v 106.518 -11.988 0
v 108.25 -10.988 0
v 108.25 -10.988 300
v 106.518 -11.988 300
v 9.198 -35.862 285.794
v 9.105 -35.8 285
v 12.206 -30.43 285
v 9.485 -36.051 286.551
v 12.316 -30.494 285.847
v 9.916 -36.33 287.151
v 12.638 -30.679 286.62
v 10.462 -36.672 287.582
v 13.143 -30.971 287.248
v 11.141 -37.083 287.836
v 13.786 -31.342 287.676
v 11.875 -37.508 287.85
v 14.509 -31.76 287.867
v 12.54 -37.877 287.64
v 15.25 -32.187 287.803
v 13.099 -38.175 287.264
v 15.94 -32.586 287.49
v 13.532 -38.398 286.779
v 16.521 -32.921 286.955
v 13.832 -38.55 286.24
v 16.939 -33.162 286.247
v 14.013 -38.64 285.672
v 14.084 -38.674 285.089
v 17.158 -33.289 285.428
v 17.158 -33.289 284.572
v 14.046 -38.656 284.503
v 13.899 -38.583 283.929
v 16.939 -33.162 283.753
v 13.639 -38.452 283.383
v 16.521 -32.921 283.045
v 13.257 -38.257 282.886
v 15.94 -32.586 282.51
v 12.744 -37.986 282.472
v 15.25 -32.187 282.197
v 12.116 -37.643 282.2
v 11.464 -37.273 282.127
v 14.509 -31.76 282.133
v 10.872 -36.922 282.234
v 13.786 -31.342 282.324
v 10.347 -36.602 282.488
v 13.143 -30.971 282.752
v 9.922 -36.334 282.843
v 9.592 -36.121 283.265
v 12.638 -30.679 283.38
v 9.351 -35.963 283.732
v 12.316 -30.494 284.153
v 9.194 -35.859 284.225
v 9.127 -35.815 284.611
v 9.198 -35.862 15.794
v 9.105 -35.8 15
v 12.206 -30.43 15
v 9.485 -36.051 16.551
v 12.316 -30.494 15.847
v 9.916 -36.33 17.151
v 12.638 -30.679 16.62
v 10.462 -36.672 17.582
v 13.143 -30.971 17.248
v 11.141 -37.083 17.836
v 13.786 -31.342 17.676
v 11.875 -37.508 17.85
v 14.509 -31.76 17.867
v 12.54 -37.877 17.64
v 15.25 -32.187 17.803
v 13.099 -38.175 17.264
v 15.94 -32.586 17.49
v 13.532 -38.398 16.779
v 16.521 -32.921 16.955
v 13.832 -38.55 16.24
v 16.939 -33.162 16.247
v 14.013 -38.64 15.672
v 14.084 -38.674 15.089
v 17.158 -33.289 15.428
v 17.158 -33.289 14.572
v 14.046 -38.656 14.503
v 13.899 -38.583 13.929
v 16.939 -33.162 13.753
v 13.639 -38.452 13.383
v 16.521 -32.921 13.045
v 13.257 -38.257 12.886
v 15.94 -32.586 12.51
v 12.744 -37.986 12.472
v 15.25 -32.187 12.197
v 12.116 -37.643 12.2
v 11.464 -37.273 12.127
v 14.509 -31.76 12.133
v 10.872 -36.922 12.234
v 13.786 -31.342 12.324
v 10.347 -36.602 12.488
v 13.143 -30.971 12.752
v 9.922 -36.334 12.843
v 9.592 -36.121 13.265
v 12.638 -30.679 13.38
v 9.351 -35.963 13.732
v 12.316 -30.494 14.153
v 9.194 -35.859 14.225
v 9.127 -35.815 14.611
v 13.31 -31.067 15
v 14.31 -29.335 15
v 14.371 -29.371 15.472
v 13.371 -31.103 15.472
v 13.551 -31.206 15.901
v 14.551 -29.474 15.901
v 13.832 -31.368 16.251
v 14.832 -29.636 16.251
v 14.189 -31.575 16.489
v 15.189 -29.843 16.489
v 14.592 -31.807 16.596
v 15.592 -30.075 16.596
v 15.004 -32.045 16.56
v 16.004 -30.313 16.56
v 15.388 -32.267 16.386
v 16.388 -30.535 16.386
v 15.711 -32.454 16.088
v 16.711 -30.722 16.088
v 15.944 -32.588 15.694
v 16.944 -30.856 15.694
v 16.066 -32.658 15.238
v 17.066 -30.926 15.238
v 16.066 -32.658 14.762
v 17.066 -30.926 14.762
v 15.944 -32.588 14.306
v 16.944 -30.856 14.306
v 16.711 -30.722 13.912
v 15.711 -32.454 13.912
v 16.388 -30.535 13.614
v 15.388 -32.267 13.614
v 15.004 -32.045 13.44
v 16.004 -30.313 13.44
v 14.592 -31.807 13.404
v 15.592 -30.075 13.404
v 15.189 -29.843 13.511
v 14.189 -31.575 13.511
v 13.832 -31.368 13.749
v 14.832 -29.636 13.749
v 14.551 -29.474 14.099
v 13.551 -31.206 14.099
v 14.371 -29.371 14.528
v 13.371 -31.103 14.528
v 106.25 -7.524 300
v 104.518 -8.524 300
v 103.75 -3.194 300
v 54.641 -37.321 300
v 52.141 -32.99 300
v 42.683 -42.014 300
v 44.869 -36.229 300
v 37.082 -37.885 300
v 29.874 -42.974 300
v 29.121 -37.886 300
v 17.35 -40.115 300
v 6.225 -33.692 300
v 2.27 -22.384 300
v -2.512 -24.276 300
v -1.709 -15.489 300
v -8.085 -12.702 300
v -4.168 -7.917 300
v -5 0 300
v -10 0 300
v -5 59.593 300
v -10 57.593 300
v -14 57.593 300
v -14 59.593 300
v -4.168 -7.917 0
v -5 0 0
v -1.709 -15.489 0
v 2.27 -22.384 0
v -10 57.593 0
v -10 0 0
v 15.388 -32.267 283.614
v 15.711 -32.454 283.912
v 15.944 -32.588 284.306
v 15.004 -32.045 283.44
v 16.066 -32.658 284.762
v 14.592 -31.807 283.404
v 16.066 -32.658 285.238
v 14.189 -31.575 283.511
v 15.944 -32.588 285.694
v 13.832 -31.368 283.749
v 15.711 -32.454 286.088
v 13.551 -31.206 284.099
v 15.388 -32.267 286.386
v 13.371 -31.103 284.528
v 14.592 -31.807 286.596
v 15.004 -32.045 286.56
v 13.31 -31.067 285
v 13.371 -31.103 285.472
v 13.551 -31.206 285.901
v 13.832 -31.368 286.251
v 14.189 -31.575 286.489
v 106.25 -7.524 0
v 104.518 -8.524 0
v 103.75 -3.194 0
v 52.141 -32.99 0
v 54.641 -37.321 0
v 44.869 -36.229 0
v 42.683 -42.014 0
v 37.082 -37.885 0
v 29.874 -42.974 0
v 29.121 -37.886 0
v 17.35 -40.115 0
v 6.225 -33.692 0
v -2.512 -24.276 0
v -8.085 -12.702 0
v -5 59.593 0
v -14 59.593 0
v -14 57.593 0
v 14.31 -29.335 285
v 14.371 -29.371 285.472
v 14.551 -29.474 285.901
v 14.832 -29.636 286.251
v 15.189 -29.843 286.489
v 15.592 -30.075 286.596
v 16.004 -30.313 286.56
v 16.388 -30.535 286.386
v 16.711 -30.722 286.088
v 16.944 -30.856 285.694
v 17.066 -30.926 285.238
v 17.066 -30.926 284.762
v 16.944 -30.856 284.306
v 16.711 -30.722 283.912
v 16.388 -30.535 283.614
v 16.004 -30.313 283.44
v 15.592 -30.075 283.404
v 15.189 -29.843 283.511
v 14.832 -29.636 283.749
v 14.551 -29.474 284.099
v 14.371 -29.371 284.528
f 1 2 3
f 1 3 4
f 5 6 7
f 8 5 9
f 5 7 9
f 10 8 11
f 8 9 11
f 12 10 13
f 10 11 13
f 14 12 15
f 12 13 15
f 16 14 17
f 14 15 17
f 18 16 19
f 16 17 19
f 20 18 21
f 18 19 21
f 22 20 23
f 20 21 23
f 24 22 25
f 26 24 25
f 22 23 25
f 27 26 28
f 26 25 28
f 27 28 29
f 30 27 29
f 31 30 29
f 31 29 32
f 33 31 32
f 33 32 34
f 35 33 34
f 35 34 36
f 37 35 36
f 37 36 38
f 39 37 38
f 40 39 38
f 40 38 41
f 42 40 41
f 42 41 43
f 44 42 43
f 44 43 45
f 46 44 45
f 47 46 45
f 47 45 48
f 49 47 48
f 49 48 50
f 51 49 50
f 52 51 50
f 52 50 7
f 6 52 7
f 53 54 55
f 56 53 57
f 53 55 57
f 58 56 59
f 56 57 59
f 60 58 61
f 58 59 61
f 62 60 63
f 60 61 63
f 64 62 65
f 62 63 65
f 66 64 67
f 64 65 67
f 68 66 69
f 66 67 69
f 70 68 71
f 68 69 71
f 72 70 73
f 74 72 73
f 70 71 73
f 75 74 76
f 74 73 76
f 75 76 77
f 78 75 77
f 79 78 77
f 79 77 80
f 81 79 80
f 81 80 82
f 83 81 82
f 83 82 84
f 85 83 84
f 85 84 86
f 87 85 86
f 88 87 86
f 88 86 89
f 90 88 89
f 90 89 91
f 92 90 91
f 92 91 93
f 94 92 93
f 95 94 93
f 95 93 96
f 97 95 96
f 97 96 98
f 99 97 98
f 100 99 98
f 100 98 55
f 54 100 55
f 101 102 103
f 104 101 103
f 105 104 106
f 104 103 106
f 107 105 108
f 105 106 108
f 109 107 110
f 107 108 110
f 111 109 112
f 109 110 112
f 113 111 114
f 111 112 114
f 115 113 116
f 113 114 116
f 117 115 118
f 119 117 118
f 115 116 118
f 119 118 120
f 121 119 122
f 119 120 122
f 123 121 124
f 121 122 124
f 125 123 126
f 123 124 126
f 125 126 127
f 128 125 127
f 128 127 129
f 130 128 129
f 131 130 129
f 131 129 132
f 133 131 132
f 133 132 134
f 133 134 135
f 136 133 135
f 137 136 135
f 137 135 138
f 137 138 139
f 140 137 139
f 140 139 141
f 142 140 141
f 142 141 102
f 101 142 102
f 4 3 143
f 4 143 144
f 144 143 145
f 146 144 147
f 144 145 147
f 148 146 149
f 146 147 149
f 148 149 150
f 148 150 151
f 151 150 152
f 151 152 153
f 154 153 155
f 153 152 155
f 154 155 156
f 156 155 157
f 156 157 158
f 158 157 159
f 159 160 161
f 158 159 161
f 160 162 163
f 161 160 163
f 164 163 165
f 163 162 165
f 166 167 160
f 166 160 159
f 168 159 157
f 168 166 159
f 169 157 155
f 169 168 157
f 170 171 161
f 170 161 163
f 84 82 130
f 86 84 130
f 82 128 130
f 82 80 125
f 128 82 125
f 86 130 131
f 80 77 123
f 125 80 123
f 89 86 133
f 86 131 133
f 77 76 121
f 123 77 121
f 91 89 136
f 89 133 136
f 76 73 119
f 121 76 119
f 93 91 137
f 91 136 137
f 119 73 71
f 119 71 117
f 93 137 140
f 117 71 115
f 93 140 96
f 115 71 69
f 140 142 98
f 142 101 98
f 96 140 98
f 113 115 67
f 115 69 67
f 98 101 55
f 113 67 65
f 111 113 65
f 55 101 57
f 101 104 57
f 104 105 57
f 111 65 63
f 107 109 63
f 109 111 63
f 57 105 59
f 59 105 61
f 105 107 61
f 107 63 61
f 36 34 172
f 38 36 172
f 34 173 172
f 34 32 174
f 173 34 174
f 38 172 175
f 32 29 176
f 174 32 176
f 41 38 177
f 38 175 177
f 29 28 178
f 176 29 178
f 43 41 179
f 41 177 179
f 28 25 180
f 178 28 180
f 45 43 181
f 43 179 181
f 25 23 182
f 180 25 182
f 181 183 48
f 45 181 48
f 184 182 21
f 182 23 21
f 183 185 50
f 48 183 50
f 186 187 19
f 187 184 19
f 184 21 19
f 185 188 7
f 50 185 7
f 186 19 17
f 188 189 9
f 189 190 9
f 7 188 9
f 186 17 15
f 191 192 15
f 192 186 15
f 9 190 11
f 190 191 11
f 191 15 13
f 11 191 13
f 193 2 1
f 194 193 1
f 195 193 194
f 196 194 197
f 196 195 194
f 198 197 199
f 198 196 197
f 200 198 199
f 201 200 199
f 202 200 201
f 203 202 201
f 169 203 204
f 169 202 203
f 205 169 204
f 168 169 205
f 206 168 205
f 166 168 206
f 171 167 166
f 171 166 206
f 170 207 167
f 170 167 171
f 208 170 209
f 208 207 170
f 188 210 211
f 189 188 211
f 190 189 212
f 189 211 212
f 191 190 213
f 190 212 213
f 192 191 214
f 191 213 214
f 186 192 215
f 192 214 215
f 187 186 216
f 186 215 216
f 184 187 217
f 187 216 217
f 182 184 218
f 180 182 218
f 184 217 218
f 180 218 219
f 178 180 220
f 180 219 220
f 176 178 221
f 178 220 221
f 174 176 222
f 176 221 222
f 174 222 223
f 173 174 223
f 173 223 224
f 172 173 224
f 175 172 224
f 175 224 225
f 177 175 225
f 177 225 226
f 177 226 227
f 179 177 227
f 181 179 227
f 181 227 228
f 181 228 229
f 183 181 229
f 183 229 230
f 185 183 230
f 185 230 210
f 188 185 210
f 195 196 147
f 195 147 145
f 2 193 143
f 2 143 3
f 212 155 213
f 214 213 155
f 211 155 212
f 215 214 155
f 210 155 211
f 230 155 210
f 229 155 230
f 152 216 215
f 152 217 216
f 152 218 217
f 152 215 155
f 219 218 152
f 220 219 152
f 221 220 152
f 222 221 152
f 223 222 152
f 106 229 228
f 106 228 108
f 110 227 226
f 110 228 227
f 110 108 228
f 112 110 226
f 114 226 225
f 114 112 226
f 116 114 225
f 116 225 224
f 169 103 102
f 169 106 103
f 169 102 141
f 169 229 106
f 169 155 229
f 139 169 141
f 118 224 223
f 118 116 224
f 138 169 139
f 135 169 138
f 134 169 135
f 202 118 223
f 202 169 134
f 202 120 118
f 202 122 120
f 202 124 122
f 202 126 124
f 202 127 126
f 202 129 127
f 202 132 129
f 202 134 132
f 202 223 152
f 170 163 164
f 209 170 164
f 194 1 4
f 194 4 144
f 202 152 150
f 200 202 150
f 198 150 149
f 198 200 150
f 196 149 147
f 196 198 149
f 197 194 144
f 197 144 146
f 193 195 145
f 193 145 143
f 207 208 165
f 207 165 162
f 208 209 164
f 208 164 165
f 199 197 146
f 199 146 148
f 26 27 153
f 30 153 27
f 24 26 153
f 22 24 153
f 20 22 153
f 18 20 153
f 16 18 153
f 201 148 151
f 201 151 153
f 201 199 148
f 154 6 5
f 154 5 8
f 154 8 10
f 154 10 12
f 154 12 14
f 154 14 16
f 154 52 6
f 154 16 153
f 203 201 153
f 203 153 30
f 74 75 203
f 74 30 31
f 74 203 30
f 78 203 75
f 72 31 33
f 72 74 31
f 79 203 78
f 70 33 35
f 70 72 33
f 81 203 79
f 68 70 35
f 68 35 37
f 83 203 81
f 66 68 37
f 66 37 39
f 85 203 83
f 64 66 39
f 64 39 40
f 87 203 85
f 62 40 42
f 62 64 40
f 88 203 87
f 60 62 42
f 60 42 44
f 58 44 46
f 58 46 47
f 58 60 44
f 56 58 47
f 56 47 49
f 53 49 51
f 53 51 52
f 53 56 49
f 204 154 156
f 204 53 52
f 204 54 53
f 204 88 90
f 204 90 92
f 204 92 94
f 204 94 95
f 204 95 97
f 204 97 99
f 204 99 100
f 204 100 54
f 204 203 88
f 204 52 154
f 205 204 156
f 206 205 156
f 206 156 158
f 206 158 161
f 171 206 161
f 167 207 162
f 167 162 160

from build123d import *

# Parameters (mm, degrees)
BOSS_EXTRUDE1_DEPTH = 300
SKETCH3_R           = 1.6
CUT_EXTRUDE1_DEPTH  = 331.850051567
CUT_EXTRUDE2_START  = -2
SKETCH4_R           = 2.875
CUT_EXTRUDE2_DEPTH  = 329.850051657


with BuildPart() as part:
    # Sketch2 → Boss-Extrude1 (new body)
    with BuildSketch(Plane.XY):
        with BuildLine():
            Line((-10, 0), (-10, 57.592991829))
            Line((-10, 57.592991829), (-14, 57.592991829))
            Line((-14, 57.592991829), (-14, 59.592991829))
            Line((-14, 59.592991829), (-10, 59.592991829))
            Line((-10, 59.592991829), (-5, 59.592991829))
            Line((-5, 59.592991829), (-5, 0))
            ThreePointArc((-5, 0), (-3.13691529, -11.76748288), (2.270101024, -22.383928263))
            Line((2.270101024, -22.383928263), (29.120915128, -37.886253013))
            ThreePointArc((29.120915128, -37.886253013), (41.018534684, -37.260643809), (52.141016151, -32.990381057))
            Line((52.141016151, -32.990381057), (103.750060963, -3.193885142))
            Line((103.750060963, -3.193885142), (106.250060963, -7.524012161))
            Line((106.250060963, -7.524012161), (108.250060963, -10.988113776))
            Line((108.250060963, -10.988113776), (106.518010155, -11.988113776))
            Line((106.518010155, -11.988113776), (104.518010155, -8.524012161))
            Line((104.518010155, -8.524012161), (54.641016151, -37.320508076))
            ThreePointArc((54.641016151, -37.320508076), (11.547005384, -37.320508076), (-10, 0))
        make_face()
    extrude(amount=BOSS_EXTRUDE1_DEPTH)

    # Sketch3 → Cut-Extrude1 (cut, through all)
    with BuildSketch(Plane(origin=(-9.125, -15.804963619, 0), x_dir=(0.8660254037844395, -0.49999999999999856, 0), z_dir=(0.49999999999999856, 0.8660254037844395, 0))):
        with Locations(Location((28.660254038, -15, 0), (0, 0, 180))):
            Circle(SKETCH3_R)
        with Locations(Location((28.660254038, -285, 0), (0, 0, 180))):
            Circle(SKETCH3_R)
    extrude(amount=-CUT_EXTRUDE1_DEPTH, mode=Mode.SUBTRACT)

    # Sketch4 → Cut-Extrude2 (cut, through all)
    with BuildSketch(Plane(origin=(-9.125, -15.804963619, 0), x_dir=(0.8660254037844395, -0.49999999999999856, 0), z_dir=(0.49999999999999856, 0.8660254037844395, 0)).offset(CUT_EXTRUDE2_START)):
        with Locations(Location((28.660254038, -15, 0), (0, 0, 180))):
            Circle(SKETCH4_R)
        with Locations(Location((28.660254038, -285, 0), (0, 0, 180))):
            Circle(SKETCH4_R)
    extrude(amount=-CUT_EXTRUDE2_DEPTH, mode=Mode.SUBTRACT)


solid = part.part
